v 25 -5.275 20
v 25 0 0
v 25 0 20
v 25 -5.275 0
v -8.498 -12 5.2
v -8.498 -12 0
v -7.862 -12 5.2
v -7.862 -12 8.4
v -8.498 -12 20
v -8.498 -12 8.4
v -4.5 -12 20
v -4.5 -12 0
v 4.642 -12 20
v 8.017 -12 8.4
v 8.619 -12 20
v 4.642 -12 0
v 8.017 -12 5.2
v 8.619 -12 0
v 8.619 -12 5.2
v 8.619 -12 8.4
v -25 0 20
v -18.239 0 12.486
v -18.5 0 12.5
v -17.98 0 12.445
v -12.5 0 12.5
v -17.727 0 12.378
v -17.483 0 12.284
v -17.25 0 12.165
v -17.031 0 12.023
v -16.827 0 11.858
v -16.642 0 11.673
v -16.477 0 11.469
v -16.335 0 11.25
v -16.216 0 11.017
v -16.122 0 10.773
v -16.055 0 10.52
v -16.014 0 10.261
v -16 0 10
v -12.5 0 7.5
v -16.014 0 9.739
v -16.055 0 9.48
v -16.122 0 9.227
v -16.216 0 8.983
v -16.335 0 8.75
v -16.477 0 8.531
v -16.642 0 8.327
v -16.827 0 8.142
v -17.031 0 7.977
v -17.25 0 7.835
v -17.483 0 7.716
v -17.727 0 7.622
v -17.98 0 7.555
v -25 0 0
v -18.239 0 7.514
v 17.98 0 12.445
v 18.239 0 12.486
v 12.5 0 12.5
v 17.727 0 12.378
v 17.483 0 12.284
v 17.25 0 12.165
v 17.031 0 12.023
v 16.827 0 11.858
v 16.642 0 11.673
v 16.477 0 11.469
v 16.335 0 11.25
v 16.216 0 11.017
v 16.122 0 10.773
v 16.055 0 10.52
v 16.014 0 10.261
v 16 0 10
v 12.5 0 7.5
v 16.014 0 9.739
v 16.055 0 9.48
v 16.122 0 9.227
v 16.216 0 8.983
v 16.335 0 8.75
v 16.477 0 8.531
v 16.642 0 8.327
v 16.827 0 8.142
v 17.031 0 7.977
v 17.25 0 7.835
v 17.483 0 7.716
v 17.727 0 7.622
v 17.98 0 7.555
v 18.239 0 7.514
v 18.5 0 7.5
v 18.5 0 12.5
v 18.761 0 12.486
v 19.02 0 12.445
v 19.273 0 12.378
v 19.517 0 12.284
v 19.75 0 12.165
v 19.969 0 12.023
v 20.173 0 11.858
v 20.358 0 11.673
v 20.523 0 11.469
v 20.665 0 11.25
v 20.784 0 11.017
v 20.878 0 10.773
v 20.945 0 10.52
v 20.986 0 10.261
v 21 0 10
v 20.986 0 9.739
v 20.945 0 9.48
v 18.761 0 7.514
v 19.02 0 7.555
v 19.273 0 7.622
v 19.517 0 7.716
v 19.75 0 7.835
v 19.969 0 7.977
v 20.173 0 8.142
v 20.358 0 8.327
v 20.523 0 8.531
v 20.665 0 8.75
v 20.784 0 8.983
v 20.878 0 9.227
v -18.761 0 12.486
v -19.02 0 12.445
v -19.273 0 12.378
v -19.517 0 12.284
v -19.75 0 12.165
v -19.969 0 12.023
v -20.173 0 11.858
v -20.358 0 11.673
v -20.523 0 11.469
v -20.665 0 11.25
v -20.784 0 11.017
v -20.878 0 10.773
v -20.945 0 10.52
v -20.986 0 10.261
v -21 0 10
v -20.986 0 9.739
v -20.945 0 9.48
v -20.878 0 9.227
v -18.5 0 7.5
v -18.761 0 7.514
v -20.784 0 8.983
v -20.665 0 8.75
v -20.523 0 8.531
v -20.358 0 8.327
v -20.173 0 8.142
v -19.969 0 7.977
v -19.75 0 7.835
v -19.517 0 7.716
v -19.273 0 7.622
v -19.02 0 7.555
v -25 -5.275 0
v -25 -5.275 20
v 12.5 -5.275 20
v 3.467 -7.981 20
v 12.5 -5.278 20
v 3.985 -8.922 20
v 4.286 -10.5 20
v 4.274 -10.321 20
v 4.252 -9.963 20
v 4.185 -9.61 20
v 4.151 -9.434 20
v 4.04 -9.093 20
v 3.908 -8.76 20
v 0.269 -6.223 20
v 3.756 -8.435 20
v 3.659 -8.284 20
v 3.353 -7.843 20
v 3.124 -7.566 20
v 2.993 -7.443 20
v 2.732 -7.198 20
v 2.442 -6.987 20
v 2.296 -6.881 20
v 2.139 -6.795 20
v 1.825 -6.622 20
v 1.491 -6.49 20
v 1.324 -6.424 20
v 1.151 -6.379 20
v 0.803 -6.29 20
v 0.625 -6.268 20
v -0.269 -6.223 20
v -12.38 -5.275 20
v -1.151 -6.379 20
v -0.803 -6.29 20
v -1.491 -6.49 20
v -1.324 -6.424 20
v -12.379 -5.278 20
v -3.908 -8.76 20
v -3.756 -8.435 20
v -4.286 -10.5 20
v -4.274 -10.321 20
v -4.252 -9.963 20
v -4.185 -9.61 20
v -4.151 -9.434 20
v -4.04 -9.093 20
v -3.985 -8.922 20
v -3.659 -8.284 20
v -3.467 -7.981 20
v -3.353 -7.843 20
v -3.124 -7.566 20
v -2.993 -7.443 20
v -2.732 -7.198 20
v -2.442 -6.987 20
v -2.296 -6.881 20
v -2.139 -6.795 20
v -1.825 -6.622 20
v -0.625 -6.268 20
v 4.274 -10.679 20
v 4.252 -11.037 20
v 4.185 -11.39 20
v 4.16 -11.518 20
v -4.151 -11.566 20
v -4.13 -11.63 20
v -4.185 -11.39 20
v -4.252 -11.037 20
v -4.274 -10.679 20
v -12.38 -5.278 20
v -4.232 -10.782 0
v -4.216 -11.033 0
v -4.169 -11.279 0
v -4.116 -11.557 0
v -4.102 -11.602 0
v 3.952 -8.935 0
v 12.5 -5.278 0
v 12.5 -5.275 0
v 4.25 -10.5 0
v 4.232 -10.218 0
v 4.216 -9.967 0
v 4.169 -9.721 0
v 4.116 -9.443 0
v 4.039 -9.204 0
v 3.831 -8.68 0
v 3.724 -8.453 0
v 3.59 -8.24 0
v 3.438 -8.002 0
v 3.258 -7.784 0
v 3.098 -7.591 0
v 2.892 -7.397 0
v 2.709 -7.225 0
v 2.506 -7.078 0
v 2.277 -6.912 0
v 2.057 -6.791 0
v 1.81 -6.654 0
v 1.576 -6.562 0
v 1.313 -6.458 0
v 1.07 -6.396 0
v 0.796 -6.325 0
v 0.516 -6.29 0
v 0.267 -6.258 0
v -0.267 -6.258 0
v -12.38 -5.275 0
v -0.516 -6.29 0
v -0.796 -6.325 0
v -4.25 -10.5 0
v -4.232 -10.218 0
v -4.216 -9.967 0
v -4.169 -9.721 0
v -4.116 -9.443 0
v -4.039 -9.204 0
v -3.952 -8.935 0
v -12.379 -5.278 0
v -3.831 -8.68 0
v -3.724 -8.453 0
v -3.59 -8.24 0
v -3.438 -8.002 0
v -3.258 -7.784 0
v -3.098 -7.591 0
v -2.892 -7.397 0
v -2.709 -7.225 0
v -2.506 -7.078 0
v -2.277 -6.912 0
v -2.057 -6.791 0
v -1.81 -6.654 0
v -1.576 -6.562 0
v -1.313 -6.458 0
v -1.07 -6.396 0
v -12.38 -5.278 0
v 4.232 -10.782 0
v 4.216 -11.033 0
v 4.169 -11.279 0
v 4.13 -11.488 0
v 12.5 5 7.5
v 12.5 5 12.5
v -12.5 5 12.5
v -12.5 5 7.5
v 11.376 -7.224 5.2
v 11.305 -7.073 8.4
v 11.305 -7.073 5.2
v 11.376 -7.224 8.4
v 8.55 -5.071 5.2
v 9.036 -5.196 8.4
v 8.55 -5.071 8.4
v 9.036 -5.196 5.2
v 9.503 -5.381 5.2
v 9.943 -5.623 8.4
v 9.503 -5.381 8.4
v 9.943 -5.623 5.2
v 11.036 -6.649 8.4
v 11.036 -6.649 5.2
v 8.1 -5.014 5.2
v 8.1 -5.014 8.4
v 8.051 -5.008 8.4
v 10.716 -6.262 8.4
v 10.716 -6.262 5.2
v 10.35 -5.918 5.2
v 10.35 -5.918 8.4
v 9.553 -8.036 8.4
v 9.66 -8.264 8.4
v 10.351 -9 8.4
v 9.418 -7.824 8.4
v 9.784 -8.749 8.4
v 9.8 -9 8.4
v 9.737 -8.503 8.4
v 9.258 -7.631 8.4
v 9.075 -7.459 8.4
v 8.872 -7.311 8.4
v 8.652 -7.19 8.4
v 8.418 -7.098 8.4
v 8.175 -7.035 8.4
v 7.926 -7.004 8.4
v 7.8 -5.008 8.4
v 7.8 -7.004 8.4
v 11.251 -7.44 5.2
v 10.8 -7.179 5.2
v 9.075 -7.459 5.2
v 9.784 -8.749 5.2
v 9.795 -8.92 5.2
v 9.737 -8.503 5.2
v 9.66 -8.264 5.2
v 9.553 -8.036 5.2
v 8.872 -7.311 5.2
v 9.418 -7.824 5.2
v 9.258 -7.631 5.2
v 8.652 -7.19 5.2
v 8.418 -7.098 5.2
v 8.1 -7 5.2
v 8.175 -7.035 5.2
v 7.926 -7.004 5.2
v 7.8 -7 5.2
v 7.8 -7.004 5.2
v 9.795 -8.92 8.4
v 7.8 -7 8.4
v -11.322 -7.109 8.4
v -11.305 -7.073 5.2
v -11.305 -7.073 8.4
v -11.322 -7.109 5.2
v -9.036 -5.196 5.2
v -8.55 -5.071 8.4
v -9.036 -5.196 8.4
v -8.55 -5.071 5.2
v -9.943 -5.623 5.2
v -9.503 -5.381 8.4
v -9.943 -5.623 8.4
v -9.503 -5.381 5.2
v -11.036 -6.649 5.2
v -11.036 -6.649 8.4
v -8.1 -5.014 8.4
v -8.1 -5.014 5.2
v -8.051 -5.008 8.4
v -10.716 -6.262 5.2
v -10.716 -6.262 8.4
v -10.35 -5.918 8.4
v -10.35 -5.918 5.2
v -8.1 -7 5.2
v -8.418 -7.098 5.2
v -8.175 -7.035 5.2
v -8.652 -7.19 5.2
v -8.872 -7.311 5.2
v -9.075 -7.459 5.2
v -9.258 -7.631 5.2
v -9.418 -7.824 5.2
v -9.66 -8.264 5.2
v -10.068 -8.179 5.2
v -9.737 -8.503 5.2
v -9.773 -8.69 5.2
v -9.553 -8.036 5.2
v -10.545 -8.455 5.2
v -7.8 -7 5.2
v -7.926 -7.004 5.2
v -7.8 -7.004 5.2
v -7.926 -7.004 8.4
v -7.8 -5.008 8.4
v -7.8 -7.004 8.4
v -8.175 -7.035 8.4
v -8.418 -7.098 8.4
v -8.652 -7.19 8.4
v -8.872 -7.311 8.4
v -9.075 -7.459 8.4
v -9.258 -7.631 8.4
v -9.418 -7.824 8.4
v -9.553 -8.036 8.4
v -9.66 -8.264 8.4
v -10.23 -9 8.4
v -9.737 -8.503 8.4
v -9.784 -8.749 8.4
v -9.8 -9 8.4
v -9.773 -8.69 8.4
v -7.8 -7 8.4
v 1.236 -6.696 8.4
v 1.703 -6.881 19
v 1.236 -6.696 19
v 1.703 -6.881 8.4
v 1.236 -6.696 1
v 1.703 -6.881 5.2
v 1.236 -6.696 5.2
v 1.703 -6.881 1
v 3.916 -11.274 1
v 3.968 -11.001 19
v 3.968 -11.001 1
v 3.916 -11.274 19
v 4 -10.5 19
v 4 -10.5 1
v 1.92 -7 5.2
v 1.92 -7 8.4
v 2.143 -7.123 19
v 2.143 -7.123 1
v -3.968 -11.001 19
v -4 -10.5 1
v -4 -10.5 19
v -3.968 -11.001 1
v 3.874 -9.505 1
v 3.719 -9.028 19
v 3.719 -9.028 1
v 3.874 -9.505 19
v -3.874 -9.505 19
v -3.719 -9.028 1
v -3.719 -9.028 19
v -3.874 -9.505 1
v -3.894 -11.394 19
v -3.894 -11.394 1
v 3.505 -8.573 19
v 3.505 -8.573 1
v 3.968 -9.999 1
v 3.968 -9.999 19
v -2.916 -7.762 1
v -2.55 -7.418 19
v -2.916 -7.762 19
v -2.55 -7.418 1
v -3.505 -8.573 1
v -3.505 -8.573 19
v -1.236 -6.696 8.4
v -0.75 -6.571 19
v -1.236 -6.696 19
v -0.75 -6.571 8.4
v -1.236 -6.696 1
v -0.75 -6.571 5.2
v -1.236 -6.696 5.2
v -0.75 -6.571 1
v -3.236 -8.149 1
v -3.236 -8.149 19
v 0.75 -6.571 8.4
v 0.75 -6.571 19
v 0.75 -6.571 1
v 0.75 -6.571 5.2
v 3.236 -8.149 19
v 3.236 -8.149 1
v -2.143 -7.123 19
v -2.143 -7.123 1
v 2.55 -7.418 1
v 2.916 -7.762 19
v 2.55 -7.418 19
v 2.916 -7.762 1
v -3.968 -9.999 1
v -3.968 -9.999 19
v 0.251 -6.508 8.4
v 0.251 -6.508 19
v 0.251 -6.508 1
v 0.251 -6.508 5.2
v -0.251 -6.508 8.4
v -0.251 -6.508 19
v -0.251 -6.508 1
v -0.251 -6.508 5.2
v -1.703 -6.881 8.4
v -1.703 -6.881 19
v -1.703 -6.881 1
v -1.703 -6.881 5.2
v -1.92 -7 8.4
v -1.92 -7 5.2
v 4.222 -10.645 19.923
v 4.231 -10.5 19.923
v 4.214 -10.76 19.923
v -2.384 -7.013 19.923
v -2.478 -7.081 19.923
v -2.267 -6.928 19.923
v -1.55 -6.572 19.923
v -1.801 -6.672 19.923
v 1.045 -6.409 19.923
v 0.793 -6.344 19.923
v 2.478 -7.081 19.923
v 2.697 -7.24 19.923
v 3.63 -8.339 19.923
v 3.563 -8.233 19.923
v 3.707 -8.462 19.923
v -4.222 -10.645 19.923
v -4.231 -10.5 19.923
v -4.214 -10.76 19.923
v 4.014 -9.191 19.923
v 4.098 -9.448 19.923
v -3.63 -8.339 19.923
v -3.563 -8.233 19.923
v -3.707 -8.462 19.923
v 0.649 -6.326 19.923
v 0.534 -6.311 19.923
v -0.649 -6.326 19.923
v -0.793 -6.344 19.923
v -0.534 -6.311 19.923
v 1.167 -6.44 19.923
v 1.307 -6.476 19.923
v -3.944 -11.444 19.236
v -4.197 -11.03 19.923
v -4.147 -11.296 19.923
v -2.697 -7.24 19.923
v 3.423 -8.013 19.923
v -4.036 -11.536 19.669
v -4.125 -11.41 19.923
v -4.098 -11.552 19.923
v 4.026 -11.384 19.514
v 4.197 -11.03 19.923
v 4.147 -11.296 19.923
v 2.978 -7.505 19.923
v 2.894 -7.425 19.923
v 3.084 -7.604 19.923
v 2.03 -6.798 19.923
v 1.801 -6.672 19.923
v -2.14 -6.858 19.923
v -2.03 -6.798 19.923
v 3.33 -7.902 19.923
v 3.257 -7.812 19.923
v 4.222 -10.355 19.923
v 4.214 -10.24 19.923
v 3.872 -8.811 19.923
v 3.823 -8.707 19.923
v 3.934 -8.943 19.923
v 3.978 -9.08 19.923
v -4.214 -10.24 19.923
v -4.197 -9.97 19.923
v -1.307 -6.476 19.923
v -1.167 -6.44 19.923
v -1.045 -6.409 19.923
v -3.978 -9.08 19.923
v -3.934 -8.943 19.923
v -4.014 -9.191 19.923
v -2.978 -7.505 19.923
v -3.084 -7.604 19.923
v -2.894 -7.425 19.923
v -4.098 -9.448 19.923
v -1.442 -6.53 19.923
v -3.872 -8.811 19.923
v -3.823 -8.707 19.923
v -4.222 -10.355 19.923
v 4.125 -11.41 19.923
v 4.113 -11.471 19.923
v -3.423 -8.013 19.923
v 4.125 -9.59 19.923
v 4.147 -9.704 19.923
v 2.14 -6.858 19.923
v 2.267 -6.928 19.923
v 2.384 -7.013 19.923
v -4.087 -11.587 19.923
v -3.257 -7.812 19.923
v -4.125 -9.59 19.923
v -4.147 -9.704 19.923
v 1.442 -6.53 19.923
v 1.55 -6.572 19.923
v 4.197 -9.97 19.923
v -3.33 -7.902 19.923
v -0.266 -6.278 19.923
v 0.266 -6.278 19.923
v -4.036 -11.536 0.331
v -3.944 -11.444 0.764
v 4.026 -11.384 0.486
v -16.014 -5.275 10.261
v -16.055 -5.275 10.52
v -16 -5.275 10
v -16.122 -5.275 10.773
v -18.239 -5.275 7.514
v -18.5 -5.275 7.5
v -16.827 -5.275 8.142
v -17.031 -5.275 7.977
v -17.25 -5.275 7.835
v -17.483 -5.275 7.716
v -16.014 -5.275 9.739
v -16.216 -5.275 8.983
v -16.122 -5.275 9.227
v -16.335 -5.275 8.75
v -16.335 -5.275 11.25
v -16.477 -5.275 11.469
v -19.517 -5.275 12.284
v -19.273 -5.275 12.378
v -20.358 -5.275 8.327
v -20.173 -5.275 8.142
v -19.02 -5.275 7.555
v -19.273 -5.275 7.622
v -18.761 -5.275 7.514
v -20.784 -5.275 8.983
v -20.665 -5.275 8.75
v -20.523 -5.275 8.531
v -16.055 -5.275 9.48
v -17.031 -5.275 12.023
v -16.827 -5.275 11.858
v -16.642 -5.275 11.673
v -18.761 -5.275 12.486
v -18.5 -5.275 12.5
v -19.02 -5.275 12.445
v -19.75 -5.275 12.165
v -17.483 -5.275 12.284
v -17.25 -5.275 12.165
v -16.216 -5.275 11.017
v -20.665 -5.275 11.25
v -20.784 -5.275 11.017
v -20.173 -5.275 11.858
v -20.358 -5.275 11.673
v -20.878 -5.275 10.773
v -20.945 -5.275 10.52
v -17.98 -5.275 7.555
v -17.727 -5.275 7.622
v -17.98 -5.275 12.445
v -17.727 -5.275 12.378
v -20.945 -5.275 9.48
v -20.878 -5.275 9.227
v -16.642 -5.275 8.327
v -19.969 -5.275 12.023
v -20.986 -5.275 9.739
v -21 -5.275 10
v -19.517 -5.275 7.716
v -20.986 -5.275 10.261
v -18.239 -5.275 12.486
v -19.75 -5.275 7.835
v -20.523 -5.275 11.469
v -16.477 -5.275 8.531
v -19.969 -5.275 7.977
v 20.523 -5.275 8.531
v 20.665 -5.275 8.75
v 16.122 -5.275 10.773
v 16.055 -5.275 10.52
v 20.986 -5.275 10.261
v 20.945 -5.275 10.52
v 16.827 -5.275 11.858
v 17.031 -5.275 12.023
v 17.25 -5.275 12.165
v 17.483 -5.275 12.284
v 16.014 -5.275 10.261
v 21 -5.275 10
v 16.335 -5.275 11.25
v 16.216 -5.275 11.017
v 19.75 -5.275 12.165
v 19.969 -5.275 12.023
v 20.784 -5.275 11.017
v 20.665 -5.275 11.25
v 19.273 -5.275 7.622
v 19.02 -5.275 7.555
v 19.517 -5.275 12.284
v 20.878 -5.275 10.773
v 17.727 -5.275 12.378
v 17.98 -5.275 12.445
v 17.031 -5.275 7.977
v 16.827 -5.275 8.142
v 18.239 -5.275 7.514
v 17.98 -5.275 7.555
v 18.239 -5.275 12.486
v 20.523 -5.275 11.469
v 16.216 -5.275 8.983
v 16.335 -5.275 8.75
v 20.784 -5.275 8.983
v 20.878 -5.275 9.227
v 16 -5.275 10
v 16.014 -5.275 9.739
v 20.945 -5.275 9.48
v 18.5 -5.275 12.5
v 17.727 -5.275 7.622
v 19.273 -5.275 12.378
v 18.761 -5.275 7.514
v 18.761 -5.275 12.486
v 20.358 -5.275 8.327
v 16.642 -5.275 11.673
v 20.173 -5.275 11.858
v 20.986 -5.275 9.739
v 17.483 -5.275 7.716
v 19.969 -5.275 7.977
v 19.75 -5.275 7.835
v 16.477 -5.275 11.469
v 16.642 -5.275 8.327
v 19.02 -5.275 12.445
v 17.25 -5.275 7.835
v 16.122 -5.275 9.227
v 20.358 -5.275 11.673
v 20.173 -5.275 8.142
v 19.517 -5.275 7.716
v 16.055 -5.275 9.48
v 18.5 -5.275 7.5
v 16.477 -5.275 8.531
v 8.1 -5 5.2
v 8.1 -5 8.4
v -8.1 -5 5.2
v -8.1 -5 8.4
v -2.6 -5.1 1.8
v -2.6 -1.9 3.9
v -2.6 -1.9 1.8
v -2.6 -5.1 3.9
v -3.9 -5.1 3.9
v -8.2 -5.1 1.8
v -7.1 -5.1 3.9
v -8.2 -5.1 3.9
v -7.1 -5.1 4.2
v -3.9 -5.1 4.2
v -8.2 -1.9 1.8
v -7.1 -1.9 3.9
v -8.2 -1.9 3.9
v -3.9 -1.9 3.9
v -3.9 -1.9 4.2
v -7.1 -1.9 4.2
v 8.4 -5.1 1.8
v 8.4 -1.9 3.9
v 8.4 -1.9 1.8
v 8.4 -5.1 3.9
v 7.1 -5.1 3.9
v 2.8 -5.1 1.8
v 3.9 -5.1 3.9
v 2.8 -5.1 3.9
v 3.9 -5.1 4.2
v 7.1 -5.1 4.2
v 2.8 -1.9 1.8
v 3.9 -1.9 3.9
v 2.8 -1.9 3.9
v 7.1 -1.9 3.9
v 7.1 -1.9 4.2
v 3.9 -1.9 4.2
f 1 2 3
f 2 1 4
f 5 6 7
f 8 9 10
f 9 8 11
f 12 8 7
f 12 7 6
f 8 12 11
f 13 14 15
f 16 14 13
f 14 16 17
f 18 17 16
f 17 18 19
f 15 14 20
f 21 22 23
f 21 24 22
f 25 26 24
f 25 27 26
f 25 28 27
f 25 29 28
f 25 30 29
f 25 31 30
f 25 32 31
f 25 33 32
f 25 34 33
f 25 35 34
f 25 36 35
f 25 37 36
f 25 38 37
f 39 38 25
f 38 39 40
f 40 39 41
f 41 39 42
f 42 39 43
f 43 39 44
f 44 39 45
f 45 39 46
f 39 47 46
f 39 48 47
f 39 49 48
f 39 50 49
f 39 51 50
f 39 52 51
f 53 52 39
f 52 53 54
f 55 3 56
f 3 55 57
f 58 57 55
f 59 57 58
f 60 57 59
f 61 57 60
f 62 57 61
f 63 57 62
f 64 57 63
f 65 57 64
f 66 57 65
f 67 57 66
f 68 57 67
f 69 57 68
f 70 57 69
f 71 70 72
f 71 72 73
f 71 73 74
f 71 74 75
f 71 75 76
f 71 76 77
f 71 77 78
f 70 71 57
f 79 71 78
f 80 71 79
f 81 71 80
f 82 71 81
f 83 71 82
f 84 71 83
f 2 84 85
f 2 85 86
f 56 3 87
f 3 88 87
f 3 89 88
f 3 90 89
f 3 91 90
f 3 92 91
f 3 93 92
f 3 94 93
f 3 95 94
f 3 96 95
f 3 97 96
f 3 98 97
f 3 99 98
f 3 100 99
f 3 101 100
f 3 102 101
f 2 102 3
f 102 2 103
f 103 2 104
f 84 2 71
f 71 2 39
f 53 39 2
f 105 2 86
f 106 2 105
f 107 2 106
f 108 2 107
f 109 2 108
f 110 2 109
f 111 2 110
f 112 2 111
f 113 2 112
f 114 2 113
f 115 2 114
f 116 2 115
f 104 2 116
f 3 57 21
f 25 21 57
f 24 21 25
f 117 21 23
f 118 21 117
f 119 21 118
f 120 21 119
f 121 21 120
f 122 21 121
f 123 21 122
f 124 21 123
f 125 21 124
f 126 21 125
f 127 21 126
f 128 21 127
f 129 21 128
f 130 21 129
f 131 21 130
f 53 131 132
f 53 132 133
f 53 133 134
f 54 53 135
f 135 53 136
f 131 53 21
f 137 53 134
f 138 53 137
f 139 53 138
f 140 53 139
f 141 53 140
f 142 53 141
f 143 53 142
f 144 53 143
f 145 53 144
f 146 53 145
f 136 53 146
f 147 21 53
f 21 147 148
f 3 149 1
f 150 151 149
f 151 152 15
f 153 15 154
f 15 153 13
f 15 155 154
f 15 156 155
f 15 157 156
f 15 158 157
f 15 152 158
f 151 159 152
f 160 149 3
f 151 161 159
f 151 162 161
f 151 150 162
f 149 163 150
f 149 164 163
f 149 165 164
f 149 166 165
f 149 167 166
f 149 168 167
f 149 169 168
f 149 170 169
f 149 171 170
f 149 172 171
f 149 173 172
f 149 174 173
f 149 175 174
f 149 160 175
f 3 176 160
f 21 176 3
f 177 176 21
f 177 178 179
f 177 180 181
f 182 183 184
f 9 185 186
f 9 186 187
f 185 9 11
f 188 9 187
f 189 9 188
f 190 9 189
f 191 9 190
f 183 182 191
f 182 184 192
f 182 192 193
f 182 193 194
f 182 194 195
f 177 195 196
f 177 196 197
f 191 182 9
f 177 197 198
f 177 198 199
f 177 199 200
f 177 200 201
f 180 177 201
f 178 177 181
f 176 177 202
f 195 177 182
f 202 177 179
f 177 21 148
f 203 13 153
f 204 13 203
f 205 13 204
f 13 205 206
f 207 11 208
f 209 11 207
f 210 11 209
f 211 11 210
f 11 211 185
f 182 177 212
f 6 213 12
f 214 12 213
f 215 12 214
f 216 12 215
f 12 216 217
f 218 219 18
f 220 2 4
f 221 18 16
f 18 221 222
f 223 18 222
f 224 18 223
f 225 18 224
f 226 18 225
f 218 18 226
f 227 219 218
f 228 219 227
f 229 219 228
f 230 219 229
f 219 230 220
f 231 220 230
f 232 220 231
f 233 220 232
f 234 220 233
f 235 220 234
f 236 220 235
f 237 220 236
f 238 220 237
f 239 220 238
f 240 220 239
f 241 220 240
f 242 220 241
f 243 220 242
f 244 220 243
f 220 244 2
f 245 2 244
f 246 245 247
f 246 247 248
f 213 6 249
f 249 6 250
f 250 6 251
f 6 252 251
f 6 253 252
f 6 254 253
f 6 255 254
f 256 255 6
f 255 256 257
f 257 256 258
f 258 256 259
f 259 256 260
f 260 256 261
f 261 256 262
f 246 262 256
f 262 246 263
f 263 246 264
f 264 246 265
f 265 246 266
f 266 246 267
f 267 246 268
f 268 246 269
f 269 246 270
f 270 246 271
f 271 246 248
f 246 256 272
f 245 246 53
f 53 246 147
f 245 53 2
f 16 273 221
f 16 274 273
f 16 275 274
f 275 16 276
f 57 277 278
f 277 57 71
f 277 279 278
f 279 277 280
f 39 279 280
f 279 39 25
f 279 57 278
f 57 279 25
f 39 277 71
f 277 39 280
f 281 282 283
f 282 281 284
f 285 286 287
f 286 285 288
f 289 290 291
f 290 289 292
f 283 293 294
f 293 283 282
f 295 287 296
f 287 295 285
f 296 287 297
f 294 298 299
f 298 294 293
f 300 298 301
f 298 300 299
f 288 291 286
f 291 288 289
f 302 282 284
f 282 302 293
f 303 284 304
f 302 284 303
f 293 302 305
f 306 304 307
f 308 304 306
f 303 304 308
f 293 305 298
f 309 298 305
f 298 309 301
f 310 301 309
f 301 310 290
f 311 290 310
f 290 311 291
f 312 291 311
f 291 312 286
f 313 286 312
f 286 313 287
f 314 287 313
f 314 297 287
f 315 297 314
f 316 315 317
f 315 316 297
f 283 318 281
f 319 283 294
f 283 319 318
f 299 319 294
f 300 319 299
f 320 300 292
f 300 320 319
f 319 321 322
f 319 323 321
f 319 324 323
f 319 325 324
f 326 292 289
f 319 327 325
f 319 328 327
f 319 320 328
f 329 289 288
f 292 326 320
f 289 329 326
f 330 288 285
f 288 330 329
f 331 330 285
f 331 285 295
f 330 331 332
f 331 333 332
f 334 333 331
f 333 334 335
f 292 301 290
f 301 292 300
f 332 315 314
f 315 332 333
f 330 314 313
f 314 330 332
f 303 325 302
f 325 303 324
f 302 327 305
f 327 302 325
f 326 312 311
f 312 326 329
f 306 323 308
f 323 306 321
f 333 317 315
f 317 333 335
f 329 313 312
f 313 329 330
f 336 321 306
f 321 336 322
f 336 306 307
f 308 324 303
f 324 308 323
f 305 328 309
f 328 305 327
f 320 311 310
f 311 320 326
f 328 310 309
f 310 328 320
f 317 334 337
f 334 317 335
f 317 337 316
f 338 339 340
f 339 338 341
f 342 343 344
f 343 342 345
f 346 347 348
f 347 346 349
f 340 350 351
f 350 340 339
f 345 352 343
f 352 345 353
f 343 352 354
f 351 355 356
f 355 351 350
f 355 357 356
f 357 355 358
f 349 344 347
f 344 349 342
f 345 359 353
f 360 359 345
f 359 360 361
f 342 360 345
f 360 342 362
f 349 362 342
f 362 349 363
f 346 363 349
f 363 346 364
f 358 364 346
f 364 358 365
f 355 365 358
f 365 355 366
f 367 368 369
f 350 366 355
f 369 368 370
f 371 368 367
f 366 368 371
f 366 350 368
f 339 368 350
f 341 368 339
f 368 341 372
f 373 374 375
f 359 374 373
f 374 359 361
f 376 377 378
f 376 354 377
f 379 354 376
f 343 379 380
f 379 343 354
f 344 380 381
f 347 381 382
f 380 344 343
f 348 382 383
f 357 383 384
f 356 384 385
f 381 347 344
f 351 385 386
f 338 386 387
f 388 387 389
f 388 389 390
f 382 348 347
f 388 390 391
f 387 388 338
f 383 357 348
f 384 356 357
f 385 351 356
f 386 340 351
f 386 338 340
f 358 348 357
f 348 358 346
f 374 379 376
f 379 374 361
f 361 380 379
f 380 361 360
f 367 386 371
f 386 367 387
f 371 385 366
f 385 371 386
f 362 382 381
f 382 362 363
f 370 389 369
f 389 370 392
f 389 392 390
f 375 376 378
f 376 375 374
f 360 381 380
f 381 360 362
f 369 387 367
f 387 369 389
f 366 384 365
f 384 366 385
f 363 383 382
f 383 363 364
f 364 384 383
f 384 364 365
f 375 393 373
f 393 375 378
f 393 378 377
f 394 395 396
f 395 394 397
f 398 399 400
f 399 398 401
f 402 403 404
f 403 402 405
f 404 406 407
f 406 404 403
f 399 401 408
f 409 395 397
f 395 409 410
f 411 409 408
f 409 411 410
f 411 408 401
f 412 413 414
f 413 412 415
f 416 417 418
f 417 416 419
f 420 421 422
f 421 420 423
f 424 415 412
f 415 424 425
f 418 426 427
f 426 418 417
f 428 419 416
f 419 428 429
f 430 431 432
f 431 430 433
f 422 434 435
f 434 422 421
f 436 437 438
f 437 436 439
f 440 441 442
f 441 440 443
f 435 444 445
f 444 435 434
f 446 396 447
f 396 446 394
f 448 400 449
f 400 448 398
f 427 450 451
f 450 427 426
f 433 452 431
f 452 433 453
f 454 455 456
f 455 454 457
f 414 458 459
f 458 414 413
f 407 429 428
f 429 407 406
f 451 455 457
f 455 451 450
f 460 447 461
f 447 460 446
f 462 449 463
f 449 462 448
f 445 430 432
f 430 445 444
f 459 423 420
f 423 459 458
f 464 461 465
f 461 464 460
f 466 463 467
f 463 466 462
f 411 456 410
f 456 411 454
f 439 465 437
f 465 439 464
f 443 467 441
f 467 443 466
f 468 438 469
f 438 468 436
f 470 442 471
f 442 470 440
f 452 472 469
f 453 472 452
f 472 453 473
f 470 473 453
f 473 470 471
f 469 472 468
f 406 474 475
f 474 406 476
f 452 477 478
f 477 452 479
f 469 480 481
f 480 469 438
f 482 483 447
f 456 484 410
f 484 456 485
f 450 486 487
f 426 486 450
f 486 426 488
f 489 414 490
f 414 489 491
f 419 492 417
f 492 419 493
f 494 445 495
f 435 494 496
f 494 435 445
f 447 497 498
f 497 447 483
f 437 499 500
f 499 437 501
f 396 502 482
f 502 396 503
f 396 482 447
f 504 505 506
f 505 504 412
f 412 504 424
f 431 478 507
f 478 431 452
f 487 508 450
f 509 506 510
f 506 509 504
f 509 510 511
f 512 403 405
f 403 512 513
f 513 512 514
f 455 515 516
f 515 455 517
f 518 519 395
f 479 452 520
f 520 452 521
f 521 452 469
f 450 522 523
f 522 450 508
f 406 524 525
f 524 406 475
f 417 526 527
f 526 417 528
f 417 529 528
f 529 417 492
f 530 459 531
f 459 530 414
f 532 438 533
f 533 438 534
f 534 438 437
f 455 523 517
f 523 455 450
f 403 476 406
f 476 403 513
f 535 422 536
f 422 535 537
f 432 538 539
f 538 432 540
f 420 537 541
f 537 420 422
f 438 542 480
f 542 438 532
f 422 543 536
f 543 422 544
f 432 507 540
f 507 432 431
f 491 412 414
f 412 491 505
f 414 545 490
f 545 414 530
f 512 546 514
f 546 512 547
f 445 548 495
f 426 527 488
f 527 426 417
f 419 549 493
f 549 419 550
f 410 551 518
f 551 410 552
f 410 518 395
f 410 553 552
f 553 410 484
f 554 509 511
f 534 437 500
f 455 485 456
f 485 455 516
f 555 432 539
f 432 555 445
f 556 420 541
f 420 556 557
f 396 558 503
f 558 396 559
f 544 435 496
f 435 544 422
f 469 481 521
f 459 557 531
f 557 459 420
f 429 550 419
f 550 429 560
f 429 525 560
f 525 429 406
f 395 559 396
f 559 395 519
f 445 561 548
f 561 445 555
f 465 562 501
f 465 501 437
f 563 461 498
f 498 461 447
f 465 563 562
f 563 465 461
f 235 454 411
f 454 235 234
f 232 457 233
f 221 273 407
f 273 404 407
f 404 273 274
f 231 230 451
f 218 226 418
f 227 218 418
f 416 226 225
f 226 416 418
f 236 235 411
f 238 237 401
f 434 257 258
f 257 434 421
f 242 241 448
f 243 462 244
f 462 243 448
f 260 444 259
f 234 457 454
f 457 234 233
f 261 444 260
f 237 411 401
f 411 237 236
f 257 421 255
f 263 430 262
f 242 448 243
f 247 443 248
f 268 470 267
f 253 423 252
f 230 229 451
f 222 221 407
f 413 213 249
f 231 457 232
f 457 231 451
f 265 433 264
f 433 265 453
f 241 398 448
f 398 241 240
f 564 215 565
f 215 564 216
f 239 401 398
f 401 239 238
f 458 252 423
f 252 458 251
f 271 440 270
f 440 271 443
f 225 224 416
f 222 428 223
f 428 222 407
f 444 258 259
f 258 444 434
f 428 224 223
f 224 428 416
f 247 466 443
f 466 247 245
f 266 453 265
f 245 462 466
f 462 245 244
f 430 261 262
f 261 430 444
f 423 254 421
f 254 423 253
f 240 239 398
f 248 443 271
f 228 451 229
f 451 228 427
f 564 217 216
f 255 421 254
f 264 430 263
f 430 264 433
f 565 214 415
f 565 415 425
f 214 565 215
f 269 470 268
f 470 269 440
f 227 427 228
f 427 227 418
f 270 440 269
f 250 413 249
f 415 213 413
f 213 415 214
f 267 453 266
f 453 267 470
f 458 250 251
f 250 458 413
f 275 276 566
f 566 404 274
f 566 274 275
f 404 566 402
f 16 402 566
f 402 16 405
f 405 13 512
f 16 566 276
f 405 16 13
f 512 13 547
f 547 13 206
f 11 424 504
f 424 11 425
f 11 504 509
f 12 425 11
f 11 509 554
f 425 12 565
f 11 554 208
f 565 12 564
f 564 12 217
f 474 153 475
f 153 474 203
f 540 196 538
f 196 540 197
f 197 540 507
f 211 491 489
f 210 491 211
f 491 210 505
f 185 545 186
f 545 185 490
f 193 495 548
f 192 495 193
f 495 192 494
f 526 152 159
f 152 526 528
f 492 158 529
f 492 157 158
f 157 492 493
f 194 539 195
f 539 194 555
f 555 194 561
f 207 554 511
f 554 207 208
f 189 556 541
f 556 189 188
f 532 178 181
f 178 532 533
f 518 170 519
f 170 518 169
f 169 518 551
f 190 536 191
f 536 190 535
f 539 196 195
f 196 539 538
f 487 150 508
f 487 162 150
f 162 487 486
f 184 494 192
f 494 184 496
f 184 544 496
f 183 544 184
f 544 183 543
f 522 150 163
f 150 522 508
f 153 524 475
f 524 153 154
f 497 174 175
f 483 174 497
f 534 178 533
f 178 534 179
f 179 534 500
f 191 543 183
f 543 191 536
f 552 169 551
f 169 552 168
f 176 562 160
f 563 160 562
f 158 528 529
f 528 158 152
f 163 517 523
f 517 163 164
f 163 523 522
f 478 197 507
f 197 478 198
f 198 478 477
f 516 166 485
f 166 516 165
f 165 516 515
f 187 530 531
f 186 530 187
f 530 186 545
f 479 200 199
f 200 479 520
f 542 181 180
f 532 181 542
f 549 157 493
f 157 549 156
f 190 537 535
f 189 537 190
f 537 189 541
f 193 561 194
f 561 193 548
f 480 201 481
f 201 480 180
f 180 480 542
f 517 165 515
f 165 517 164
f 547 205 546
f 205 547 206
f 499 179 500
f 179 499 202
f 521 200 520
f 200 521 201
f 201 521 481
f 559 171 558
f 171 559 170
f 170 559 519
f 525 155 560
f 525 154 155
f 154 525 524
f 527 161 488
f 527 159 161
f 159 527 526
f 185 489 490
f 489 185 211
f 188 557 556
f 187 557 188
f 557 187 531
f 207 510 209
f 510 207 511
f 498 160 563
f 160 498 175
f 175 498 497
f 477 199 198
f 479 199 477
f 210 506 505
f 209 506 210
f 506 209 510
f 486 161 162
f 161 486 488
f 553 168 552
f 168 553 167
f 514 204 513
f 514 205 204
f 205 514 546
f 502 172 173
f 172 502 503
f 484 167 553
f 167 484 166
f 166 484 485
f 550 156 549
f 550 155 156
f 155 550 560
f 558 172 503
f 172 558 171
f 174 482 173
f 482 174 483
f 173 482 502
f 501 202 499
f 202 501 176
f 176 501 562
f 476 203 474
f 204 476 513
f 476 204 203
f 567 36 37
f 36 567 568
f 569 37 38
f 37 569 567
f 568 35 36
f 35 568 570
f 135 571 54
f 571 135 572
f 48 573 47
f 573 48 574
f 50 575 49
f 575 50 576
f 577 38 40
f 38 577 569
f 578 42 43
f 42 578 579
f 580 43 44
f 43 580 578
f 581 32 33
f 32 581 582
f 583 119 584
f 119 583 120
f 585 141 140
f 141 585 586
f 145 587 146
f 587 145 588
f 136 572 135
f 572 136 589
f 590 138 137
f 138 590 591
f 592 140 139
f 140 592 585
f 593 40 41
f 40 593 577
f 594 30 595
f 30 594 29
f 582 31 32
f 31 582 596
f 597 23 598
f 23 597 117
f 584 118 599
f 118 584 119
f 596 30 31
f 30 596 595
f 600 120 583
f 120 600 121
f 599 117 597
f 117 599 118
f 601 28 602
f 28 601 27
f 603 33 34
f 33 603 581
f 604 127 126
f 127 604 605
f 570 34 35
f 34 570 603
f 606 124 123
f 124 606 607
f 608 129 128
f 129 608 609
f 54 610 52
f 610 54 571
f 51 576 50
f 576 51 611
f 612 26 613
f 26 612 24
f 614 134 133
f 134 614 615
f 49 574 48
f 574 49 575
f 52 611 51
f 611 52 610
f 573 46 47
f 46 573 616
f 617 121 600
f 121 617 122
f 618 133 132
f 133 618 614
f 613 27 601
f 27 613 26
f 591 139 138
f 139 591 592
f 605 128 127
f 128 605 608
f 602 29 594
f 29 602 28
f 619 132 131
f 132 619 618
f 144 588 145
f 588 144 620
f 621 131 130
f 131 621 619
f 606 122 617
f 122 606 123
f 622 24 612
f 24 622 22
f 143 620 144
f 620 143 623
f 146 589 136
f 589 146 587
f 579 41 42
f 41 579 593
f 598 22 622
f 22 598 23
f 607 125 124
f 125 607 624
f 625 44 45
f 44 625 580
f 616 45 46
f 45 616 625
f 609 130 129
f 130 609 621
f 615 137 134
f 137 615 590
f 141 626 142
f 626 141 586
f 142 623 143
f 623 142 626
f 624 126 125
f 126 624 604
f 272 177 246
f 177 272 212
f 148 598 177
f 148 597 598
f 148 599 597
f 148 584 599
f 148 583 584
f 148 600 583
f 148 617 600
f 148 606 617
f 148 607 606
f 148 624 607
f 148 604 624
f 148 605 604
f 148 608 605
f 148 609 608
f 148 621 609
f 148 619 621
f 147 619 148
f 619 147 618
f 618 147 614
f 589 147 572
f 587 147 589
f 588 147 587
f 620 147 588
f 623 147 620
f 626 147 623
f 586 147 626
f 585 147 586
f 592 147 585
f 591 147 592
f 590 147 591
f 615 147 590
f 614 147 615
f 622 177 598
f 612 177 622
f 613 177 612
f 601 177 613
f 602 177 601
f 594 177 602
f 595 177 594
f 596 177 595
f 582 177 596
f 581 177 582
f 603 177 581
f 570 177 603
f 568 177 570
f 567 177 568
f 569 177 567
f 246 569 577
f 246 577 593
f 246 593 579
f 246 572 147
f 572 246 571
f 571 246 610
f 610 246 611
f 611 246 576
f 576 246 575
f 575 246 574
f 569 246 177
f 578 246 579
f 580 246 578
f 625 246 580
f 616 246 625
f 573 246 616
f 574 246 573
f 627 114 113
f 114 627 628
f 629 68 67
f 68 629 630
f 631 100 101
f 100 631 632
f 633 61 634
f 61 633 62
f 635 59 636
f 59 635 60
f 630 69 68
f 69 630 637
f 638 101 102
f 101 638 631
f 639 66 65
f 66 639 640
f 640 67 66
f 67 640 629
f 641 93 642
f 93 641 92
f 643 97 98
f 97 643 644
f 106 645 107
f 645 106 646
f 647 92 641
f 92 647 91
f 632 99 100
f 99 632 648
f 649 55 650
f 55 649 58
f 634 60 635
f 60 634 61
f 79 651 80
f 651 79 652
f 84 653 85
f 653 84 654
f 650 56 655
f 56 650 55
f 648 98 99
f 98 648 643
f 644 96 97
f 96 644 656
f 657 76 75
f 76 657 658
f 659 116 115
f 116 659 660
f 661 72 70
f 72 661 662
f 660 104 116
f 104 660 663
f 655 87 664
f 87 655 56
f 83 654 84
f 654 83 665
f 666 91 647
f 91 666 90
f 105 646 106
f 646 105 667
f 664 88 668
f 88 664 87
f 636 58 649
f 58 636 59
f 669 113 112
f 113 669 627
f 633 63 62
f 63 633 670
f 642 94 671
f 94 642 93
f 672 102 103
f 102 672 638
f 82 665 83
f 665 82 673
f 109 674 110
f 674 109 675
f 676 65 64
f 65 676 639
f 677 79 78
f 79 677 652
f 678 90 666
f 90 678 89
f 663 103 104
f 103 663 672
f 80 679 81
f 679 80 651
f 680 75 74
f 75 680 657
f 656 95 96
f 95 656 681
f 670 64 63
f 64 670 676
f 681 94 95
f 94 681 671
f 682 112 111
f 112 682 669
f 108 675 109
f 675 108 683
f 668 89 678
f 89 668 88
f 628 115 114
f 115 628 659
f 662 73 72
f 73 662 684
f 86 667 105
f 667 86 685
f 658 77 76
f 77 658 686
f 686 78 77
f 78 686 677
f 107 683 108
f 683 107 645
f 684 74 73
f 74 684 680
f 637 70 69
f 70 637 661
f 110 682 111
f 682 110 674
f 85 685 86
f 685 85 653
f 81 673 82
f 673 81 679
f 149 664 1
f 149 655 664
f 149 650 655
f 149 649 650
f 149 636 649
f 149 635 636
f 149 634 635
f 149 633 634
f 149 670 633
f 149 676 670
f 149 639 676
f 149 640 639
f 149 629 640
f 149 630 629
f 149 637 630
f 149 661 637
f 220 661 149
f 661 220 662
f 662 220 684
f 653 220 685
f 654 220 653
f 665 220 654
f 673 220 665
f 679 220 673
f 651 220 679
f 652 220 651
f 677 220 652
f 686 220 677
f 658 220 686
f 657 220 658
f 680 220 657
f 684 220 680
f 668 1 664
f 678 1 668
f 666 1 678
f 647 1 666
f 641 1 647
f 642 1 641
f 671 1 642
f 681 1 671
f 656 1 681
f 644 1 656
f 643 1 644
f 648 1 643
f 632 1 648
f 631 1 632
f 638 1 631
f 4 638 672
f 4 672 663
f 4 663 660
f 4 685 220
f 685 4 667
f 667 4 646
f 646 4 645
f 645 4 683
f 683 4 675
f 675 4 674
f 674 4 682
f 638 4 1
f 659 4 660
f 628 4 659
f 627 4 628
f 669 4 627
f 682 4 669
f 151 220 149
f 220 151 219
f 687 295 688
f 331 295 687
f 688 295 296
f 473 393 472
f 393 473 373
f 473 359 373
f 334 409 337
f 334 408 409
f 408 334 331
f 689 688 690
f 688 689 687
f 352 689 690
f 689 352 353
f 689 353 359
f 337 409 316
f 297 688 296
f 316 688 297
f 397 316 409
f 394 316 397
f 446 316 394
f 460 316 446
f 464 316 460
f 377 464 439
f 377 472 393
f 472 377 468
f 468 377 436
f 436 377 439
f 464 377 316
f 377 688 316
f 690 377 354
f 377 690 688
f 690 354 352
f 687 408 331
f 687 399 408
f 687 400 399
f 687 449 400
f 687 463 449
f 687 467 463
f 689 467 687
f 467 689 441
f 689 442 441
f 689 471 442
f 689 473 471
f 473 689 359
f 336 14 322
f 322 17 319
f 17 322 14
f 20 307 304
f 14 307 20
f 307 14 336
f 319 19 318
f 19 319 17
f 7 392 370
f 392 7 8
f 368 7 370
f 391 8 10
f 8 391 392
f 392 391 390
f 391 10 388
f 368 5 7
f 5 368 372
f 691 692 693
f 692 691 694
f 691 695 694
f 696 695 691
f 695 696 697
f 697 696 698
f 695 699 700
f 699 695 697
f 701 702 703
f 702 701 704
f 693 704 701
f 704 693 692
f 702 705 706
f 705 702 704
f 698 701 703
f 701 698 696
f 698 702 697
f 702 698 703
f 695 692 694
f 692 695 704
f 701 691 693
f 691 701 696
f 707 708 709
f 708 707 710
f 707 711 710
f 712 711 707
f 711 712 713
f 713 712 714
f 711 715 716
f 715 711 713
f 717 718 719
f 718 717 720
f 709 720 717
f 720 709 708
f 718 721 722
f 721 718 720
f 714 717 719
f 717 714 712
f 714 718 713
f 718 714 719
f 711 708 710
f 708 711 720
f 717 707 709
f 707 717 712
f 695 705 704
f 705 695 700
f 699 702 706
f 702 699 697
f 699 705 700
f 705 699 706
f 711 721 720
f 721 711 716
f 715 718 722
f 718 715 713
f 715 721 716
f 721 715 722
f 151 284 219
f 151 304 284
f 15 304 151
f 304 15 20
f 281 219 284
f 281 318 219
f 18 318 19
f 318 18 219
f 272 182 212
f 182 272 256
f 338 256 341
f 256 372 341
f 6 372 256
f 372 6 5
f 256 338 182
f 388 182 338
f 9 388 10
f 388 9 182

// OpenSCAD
// PRUSA iteration4
// Y holder front
// GNU GPL v3
// Josef Průša <iam@josefprusa.cz> and contributors
// http://www.reprap.org/wiki/Prusa_Mendel
// http://prusamendel.org

module ziptie_round_edge()
{
    difference()
    {
        translate([0,0,0]) rotate([90,0,0]) cylinder( h=3.2, r=4, $fn=50 );  
        translate([0,1,0]) rotate([90,0,0]) cylinder( h=5, r=2, $fn=50 );  
        translate([-10,-4,0]) cube([20,5,5]);
        translate([-20,-4,-13]) cube([20,5,20]);
    }
}


module part()    
{

    difference()
    {
        union()
        {
            // body block
            translate([-25,0,0]) cube([50,20,12]); 
            translate([-12.5,7.5,-5]) cube([25,5,5]);
        }

        // y-axis cut
        translate([0,21,10.5]) rotate([90,0,0]) cylinder( h=21, r=4, $fn=50 );
        
        translate([0,21,10.5]) rotate([90,0,0]) cylinder( h=2, r1=4.5, r2=4, $fn=50 );
        
        translate([0,1,10.5]) rotate([90,0,0]) cylinder( h=2, r1=4, r2=4.5, $fn=50 );
        translate([-7,-1,14.5]) rotate([0,45,0]) cube([10,22,10]);
        
        translate([0,21,10.5]) rotate([90,0,0]) cylinder( h=1.4, r1=5, r2=4, $fn=50 );

        // screw holes
          translate([-18.5,10,-6]) cylinder( h=21, r=2.5, $fn=60 );
          translate([-25.38,-1,5.275]) cube([13,22,10]);
          translate([18.5,10,-6]) cylinder( h=20, r=2.5, $fn=60 );
          translate([12.5,-1,5.275]) cube([13,22,10]);

        // ziptie
        translate([7.8,8.4,9]) ziptie_round_edge();
        translate([-7.8,5.2,9]) rotate([0,0,180]) ziptie_round_edge();
        translate([-8.1,5.2,5]) cube([16.2,3.2,2]);
        translate([0.8,5.2,24.5]) rotate([0,60,0]) cube([20,3.2,2]);
        translate([-1.8,5.2,26.5]) rotate([0,120,0]) cube([20,3.2,2]);
        
        // nut print supports
        translate([-8.2,1.8,3.5-3.2/2]) cube([5.6,2.1,3.2]);
        translate([2.8,1.8,3.5-3.2/2]) cube([5.6,2.1,3.2]);
        translate([-7.1,2.1,3.5-3.2/2]) cube([3.2,2.1,3.2]);
        translate([3.9,2.1,3.5-3.2/2]) cube([3.2,2.1,3.2]);


        // upper corners
        translate([4,-1,20]) rotate([0,60,0]) cube([17,30,20]);
        translate([-21.2,-1,30]) rotate([0,120,0]) cube([17,30,20]);

    }
}


rotate([90,0,0])part();
